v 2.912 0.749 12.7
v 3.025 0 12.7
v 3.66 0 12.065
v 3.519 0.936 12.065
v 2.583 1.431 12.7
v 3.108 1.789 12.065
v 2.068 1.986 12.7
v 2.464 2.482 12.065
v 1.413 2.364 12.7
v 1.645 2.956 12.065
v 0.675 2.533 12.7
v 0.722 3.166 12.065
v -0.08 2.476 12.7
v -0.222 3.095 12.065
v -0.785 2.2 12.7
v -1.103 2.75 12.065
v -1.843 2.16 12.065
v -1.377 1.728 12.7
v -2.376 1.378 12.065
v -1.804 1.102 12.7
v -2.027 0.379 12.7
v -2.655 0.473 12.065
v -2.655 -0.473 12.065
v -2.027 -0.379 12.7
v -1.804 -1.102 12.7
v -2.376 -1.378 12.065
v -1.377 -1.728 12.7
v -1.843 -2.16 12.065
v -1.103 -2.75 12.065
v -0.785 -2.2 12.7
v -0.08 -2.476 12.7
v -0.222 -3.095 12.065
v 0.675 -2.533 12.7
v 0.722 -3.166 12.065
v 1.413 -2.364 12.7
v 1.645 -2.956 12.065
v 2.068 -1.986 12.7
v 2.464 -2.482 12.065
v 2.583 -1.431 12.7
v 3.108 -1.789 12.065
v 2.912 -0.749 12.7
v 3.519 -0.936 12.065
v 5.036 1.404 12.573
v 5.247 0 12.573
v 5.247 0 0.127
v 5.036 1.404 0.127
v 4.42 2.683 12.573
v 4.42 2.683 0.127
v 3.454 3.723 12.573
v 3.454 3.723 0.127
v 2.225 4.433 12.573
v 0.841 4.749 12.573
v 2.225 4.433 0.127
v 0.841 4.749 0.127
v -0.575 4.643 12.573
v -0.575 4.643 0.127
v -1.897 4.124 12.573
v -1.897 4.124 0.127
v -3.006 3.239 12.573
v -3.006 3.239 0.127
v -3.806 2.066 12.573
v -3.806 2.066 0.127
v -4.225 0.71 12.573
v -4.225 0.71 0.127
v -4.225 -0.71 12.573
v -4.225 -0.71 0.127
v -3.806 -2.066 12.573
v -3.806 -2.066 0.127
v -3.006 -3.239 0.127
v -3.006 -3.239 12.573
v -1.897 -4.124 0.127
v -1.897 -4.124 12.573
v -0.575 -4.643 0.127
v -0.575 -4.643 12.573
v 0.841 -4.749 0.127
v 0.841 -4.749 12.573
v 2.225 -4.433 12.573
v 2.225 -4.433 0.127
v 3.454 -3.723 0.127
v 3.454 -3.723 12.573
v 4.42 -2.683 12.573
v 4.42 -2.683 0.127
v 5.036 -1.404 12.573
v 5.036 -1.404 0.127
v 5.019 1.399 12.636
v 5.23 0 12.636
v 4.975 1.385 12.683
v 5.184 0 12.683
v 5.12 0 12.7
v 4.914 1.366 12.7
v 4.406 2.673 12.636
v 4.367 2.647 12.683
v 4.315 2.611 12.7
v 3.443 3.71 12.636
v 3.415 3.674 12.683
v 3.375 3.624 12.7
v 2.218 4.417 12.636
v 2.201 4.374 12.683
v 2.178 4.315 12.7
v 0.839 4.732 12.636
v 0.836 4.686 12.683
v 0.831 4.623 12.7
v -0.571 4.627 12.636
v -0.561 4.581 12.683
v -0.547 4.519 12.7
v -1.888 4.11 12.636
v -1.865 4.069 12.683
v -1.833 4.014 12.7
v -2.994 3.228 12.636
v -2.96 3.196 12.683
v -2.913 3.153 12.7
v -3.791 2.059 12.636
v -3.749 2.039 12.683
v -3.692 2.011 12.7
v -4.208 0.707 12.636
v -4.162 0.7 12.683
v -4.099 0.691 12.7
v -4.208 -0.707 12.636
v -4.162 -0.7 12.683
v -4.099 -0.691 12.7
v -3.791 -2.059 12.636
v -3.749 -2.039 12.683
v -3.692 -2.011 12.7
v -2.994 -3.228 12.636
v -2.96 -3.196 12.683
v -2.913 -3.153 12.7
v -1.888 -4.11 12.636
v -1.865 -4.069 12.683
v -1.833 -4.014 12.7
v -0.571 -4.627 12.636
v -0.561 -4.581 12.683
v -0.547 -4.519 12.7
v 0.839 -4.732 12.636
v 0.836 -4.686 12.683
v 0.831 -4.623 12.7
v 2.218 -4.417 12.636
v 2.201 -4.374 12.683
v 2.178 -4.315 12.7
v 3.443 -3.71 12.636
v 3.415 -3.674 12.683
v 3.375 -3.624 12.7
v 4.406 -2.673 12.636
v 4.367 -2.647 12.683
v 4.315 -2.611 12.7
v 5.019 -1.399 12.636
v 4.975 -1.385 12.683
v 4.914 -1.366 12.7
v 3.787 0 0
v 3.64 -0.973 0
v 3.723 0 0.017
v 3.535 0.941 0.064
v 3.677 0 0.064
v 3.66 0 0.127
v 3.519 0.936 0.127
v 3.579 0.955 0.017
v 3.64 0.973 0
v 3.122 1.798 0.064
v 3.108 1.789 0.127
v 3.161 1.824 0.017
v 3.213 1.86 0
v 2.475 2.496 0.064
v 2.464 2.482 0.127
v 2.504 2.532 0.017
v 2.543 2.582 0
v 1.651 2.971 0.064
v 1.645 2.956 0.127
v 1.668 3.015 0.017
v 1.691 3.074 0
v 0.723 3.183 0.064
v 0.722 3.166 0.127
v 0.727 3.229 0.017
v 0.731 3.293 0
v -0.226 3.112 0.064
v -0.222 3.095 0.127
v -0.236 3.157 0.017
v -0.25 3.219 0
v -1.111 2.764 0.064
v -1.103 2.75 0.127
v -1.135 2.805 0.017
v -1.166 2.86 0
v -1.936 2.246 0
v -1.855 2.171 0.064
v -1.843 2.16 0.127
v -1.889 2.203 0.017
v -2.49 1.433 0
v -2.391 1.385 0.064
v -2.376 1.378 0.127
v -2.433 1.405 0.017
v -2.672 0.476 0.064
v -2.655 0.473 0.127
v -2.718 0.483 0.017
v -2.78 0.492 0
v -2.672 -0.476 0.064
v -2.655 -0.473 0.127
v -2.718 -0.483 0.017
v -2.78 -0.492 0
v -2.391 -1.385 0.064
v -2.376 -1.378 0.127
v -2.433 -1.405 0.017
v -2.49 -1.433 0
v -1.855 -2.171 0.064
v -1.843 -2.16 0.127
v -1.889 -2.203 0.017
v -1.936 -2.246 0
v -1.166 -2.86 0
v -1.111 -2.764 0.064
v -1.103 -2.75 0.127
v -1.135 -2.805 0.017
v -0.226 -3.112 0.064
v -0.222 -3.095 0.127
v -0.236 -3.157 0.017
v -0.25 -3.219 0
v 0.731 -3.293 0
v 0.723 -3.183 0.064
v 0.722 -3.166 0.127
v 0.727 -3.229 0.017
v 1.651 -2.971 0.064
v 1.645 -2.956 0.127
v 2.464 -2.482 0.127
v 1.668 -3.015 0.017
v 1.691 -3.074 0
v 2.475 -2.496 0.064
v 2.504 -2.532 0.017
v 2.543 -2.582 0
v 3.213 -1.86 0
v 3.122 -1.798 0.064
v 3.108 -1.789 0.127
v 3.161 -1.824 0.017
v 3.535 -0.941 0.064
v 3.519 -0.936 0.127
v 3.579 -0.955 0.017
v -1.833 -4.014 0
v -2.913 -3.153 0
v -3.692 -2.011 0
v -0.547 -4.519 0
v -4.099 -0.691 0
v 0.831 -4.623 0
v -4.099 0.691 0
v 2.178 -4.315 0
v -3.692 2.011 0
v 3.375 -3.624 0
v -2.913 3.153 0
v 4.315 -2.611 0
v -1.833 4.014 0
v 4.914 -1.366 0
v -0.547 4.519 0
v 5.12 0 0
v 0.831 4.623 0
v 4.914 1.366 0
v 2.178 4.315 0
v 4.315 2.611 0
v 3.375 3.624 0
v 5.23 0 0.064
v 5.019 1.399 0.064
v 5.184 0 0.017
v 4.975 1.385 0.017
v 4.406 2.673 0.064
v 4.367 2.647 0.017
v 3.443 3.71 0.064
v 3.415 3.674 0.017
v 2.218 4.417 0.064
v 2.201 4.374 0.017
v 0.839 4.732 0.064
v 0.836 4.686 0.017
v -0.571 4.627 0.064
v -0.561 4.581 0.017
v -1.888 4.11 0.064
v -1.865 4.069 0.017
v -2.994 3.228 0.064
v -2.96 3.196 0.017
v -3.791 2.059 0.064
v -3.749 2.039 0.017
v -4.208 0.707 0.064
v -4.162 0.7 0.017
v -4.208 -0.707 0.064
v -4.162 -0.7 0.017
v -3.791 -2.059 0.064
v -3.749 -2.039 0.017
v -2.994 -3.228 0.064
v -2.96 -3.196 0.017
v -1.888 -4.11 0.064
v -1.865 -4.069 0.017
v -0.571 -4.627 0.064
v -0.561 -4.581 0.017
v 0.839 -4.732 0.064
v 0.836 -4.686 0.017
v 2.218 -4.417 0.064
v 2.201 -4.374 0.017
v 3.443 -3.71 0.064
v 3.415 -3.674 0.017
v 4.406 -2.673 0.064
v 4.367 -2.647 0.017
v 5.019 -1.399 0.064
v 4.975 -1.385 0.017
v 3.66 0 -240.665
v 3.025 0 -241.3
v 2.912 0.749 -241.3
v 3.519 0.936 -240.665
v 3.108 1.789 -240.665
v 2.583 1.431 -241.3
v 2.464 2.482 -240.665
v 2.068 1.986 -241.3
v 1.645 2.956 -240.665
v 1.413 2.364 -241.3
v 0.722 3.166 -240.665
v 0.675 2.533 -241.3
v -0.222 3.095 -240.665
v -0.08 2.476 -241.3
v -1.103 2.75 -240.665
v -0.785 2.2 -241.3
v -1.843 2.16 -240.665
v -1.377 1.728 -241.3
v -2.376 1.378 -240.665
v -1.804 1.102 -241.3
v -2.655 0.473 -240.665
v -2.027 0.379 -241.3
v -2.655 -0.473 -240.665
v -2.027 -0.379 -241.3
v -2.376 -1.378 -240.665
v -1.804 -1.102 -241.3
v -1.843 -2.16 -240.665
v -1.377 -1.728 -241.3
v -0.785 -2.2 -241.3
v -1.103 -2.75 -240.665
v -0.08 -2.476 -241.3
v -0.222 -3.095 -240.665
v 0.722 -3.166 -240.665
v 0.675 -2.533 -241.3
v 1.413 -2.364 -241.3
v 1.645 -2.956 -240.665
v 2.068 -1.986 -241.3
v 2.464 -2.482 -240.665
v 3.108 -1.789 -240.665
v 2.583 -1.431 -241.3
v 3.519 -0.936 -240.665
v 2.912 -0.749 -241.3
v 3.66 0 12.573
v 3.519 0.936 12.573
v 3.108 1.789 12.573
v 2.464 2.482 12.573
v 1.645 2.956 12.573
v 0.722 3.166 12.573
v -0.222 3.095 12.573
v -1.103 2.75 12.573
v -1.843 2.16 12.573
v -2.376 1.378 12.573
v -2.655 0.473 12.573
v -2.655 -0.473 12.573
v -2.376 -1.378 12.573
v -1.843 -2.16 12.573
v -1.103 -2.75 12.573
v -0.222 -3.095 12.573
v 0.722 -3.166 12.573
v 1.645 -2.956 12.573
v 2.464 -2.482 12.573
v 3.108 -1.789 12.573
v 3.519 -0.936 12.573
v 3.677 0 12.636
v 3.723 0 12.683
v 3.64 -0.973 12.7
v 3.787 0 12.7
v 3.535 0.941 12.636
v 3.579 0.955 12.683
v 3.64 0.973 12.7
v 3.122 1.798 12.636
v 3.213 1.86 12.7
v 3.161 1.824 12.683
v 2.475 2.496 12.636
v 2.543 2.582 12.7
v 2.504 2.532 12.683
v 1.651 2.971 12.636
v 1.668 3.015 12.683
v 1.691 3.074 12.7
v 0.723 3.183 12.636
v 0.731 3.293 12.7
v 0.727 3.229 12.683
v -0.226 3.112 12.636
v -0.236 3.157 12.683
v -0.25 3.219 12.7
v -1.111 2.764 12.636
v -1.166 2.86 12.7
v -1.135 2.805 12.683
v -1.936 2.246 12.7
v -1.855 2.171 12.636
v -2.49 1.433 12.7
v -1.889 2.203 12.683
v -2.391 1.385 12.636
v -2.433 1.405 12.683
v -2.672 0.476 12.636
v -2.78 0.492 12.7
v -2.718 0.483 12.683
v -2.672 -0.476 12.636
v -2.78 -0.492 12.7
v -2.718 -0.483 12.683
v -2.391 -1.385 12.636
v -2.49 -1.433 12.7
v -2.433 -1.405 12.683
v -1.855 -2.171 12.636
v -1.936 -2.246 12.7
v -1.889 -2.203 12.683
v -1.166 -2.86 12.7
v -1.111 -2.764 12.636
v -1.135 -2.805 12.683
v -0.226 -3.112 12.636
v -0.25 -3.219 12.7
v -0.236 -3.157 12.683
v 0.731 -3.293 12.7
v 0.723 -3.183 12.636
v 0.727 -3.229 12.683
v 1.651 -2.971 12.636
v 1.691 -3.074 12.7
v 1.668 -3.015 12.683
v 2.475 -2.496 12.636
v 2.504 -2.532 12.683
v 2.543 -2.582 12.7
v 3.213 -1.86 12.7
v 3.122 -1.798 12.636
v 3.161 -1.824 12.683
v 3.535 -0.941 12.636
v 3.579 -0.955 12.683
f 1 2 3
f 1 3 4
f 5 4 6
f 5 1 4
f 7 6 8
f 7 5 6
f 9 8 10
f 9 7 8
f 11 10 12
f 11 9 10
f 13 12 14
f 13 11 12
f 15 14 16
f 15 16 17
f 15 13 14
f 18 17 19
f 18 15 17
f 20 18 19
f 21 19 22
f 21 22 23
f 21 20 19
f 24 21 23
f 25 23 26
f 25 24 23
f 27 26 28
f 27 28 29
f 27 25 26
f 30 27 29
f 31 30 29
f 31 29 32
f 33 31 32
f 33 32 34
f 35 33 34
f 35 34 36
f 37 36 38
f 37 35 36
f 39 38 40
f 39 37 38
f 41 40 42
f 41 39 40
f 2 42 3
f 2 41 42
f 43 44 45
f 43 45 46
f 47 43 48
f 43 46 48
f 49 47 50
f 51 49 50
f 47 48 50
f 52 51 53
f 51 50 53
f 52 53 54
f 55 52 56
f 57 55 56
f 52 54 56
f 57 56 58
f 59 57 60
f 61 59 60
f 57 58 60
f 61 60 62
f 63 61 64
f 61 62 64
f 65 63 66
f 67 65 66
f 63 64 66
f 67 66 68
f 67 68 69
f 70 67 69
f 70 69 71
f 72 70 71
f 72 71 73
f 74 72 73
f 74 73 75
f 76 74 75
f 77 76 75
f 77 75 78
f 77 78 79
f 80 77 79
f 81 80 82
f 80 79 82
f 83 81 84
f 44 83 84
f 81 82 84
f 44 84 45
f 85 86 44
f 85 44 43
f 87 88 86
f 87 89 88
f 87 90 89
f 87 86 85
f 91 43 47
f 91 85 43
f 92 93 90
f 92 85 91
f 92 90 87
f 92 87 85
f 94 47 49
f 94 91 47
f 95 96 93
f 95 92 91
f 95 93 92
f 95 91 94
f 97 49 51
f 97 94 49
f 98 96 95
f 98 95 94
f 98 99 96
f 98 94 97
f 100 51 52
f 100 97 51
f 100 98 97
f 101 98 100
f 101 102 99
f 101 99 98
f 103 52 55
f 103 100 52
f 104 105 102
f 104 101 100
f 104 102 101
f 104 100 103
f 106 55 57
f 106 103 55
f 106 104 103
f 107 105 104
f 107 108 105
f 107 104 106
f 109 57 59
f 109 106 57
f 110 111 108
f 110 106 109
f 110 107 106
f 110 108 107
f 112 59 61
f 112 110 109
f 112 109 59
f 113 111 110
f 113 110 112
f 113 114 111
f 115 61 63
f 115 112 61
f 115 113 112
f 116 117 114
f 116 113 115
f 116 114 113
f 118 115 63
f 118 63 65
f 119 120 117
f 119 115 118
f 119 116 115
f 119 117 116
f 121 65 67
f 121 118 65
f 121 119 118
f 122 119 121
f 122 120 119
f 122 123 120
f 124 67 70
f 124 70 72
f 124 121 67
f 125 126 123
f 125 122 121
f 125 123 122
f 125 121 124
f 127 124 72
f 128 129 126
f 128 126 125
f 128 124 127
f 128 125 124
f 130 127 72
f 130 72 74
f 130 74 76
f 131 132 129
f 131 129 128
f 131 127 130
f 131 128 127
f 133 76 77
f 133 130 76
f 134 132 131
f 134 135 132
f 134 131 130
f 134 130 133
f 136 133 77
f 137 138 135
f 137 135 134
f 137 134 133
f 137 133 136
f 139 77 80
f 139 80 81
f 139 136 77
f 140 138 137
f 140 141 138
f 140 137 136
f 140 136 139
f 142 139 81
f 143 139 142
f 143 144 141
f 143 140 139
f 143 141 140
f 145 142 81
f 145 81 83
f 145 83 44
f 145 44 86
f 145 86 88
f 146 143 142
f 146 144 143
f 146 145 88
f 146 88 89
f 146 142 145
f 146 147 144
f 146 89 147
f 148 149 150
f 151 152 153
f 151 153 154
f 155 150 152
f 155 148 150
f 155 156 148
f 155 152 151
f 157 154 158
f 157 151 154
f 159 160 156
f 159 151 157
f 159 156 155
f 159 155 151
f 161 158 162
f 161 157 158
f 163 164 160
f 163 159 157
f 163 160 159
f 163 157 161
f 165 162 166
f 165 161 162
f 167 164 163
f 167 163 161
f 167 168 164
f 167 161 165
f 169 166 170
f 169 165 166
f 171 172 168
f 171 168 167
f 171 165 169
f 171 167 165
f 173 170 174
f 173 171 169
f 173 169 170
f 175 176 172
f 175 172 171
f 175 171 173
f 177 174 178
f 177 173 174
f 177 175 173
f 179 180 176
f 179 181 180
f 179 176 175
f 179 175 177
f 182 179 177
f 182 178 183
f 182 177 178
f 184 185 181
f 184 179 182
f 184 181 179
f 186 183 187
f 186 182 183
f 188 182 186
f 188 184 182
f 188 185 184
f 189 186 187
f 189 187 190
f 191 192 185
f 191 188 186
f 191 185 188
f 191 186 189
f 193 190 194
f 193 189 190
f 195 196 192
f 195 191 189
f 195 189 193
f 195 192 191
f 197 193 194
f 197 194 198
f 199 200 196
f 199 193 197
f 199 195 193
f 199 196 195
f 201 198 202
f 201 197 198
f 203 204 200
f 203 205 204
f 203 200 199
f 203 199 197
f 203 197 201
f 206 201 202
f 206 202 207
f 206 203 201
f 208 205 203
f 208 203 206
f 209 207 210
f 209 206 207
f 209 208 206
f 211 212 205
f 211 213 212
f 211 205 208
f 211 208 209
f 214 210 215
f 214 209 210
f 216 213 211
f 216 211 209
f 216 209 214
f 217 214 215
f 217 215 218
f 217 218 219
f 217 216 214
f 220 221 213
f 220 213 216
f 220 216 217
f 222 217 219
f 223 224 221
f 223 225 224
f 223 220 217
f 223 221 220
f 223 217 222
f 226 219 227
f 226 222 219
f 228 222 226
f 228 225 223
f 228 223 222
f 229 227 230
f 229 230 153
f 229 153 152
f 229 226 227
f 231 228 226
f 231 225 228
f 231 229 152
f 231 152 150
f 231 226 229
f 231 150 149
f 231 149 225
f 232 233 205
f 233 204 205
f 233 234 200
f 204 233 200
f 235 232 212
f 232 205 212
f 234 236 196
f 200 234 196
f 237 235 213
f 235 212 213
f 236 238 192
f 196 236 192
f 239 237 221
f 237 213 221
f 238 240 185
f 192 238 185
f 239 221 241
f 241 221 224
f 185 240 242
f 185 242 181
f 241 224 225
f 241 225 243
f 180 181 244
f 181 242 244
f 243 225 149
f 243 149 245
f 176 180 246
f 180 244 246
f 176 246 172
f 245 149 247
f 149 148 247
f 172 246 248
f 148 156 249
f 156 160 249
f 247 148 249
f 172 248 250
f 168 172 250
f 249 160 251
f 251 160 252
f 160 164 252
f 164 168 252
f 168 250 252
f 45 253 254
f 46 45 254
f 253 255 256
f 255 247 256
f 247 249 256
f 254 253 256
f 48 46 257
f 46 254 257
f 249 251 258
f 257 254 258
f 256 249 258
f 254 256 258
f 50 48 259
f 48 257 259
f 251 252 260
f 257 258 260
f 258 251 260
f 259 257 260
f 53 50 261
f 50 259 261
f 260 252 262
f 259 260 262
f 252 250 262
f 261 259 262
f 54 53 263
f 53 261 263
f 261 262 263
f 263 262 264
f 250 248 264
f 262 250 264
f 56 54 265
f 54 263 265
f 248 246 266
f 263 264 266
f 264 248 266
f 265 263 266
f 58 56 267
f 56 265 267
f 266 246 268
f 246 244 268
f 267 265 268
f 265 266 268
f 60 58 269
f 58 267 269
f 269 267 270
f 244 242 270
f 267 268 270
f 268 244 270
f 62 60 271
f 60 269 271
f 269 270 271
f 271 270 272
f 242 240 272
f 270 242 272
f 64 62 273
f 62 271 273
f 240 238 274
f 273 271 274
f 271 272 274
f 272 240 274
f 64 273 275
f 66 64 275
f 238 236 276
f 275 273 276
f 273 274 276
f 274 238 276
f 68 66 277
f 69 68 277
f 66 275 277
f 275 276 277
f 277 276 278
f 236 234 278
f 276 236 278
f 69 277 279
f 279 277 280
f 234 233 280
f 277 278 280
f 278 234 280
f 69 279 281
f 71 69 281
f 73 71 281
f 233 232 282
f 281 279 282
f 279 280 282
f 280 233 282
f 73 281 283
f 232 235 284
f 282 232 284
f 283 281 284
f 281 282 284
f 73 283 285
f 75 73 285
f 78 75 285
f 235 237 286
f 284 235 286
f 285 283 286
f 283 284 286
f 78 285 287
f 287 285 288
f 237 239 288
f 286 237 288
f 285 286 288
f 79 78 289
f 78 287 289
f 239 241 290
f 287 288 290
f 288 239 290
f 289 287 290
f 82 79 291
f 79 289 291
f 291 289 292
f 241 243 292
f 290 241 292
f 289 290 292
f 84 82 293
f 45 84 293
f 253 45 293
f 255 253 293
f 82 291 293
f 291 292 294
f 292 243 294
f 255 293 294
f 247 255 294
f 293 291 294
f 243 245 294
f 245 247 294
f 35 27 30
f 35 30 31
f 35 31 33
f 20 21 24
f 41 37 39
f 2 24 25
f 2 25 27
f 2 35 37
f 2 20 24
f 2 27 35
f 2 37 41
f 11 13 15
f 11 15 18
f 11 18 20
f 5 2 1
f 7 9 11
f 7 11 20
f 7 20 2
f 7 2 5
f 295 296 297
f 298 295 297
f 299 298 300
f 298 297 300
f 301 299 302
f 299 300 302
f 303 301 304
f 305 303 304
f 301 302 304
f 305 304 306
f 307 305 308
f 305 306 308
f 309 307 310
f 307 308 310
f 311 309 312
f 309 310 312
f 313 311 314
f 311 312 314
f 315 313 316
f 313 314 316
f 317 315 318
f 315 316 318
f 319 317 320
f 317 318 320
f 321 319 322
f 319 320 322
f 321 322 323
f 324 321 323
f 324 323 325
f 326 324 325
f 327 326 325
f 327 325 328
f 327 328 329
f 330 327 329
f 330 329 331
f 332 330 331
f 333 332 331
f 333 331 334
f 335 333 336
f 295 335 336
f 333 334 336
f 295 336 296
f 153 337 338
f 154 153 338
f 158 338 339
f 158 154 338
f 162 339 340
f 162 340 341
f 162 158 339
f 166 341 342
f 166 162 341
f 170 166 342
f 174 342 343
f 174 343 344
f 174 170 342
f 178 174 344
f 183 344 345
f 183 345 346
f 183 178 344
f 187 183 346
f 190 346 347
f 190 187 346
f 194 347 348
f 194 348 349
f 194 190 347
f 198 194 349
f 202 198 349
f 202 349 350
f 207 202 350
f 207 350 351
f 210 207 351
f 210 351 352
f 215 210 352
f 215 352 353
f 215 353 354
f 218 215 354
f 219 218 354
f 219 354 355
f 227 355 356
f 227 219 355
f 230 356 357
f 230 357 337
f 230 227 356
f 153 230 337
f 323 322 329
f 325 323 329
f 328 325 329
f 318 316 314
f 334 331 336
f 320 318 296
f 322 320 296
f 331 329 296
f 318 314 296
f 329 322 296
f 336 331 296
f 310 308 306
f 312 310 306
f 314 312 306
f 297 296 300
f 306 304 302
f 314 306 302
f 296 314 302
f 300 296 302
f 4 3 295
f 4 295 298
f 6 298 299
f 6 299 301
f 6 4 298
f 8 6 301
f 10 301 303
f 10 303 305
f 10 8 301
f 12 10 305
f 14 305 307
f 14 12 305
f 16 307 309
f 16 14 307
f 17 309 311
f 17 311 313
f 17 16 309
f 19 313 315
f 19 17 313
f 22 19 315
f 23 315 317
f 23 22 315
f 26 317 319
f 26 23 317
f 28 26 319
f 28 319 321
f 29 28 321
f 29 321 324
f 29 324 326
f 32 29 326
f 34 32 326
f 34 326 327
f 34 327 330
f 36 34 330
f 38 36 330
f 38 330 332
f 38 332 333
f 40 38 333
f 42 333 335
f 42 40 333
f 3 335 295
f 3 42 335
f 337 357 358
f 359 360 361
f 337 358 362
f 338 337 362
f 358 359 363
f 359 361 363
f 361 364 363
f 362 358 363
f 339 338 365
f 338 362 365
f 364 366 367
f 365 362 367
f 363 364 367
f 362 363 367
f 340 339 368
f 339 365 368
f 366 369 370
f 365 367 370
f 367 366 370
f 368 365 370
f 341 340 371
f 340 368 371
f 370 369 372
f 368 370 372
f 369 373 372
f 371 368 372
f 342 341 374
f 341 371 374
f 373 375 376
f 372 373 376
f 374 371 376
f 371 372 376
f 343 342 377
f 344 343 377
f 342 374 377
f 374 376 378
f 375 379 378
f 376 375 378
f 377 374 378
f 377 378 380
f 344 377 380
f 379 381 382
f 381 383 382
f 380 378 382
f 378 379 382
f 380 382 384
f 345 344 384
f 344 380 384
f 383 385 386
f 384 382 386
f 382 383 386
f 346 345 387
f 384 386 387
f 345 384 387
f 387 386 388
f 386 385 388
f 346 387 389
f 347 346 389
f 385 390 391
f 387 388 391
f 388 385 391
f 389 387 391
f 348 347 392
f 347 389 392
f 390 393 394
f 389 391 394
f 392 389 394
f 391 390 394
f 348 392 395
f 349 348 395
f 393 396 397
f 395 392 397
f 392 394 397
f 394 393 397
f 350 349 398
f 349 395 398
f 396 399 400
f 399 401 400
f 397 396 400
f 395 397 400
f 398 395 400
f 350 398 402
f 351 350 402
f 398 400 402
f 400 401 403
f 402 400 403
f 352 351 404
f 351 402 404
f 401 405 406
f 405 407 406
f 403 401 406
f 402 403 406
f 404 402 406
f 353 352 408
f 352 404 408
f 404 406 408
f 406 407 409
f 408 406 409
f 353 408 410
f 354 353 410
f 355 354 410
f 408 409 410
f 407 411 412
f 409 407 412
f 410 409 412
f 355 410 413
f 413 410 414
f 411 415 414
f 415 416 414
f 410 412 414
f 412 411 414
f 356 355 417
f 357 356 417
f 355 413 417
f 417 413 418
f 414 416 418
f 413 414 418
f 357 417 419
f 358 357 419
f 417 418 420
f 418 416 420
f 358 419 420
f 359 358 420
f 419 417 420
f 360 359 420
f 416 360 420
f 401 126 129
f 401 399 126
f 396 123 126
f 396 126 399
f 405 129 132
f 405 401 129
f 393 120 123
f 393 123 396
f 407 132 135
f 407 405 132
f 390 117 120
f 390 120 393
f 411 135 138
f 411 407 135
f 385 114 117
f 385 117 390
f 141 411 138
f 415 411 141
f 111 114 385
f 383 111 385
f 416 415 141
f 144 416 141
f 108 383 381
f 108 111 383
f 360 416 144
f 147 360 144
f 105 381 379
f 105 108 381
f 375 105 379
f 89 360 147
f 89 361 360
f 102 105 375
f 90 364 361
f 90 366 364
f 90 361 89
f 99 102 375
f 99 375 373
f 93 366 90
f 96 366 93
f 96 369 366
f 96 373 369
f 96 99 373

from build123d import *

# Parameters (mm, degrees)
F0_R     = 4.7625
F0_R_2   = 3.175
F1_DEPTH = 12.7
F2_R     = 0.127
F3_R     = 3.175
F4_DEPTH = 254
F5_SIZE  = 0.635


with BuildPart() as f1:
    # F0 (on Top) → F1 (new body)
    with BuildSketch(Plane.XY):
        with Locations((0.48473, 0)):
            Circle(F0_R)
        with Locations((0.48473, 0)):
            Circle(F0_R_2, mode=Mode.SUBTRACT)
    extrude(amount=F1_DEPTH)

    # F2
    f2_edges = [f1.edges().sort_by_distance(p)[0] for p in [
        (-4.27777, 0, 0),
        (-2.69027, 0, 0),
        (-2.69027, 0, 12.7),
        (-4.27777, 0, 12.7),
    ]]
    fillet(f2_edges, radius=F2_R)


with BuildPart() as f4:
    # F3 (on face) → F4 (new body)
    with BuildSketch(Plane.XY.offset(12.7)):
        with Locations((0.48473, 0)):
            Circle(F3_R)
    extrude(amount=-F4_DEPTH)

    # F5
    f5_edges = [f4.edges().sort_by_distance(p)[0] for p in [
        (-2.69027, 0, -241.3),
        (-2.69027, 0, 12.7),
    ]]
    chamfer(f5_edges, length=F5_SIZE)


solid = Compound([f1.part, f4.part])
